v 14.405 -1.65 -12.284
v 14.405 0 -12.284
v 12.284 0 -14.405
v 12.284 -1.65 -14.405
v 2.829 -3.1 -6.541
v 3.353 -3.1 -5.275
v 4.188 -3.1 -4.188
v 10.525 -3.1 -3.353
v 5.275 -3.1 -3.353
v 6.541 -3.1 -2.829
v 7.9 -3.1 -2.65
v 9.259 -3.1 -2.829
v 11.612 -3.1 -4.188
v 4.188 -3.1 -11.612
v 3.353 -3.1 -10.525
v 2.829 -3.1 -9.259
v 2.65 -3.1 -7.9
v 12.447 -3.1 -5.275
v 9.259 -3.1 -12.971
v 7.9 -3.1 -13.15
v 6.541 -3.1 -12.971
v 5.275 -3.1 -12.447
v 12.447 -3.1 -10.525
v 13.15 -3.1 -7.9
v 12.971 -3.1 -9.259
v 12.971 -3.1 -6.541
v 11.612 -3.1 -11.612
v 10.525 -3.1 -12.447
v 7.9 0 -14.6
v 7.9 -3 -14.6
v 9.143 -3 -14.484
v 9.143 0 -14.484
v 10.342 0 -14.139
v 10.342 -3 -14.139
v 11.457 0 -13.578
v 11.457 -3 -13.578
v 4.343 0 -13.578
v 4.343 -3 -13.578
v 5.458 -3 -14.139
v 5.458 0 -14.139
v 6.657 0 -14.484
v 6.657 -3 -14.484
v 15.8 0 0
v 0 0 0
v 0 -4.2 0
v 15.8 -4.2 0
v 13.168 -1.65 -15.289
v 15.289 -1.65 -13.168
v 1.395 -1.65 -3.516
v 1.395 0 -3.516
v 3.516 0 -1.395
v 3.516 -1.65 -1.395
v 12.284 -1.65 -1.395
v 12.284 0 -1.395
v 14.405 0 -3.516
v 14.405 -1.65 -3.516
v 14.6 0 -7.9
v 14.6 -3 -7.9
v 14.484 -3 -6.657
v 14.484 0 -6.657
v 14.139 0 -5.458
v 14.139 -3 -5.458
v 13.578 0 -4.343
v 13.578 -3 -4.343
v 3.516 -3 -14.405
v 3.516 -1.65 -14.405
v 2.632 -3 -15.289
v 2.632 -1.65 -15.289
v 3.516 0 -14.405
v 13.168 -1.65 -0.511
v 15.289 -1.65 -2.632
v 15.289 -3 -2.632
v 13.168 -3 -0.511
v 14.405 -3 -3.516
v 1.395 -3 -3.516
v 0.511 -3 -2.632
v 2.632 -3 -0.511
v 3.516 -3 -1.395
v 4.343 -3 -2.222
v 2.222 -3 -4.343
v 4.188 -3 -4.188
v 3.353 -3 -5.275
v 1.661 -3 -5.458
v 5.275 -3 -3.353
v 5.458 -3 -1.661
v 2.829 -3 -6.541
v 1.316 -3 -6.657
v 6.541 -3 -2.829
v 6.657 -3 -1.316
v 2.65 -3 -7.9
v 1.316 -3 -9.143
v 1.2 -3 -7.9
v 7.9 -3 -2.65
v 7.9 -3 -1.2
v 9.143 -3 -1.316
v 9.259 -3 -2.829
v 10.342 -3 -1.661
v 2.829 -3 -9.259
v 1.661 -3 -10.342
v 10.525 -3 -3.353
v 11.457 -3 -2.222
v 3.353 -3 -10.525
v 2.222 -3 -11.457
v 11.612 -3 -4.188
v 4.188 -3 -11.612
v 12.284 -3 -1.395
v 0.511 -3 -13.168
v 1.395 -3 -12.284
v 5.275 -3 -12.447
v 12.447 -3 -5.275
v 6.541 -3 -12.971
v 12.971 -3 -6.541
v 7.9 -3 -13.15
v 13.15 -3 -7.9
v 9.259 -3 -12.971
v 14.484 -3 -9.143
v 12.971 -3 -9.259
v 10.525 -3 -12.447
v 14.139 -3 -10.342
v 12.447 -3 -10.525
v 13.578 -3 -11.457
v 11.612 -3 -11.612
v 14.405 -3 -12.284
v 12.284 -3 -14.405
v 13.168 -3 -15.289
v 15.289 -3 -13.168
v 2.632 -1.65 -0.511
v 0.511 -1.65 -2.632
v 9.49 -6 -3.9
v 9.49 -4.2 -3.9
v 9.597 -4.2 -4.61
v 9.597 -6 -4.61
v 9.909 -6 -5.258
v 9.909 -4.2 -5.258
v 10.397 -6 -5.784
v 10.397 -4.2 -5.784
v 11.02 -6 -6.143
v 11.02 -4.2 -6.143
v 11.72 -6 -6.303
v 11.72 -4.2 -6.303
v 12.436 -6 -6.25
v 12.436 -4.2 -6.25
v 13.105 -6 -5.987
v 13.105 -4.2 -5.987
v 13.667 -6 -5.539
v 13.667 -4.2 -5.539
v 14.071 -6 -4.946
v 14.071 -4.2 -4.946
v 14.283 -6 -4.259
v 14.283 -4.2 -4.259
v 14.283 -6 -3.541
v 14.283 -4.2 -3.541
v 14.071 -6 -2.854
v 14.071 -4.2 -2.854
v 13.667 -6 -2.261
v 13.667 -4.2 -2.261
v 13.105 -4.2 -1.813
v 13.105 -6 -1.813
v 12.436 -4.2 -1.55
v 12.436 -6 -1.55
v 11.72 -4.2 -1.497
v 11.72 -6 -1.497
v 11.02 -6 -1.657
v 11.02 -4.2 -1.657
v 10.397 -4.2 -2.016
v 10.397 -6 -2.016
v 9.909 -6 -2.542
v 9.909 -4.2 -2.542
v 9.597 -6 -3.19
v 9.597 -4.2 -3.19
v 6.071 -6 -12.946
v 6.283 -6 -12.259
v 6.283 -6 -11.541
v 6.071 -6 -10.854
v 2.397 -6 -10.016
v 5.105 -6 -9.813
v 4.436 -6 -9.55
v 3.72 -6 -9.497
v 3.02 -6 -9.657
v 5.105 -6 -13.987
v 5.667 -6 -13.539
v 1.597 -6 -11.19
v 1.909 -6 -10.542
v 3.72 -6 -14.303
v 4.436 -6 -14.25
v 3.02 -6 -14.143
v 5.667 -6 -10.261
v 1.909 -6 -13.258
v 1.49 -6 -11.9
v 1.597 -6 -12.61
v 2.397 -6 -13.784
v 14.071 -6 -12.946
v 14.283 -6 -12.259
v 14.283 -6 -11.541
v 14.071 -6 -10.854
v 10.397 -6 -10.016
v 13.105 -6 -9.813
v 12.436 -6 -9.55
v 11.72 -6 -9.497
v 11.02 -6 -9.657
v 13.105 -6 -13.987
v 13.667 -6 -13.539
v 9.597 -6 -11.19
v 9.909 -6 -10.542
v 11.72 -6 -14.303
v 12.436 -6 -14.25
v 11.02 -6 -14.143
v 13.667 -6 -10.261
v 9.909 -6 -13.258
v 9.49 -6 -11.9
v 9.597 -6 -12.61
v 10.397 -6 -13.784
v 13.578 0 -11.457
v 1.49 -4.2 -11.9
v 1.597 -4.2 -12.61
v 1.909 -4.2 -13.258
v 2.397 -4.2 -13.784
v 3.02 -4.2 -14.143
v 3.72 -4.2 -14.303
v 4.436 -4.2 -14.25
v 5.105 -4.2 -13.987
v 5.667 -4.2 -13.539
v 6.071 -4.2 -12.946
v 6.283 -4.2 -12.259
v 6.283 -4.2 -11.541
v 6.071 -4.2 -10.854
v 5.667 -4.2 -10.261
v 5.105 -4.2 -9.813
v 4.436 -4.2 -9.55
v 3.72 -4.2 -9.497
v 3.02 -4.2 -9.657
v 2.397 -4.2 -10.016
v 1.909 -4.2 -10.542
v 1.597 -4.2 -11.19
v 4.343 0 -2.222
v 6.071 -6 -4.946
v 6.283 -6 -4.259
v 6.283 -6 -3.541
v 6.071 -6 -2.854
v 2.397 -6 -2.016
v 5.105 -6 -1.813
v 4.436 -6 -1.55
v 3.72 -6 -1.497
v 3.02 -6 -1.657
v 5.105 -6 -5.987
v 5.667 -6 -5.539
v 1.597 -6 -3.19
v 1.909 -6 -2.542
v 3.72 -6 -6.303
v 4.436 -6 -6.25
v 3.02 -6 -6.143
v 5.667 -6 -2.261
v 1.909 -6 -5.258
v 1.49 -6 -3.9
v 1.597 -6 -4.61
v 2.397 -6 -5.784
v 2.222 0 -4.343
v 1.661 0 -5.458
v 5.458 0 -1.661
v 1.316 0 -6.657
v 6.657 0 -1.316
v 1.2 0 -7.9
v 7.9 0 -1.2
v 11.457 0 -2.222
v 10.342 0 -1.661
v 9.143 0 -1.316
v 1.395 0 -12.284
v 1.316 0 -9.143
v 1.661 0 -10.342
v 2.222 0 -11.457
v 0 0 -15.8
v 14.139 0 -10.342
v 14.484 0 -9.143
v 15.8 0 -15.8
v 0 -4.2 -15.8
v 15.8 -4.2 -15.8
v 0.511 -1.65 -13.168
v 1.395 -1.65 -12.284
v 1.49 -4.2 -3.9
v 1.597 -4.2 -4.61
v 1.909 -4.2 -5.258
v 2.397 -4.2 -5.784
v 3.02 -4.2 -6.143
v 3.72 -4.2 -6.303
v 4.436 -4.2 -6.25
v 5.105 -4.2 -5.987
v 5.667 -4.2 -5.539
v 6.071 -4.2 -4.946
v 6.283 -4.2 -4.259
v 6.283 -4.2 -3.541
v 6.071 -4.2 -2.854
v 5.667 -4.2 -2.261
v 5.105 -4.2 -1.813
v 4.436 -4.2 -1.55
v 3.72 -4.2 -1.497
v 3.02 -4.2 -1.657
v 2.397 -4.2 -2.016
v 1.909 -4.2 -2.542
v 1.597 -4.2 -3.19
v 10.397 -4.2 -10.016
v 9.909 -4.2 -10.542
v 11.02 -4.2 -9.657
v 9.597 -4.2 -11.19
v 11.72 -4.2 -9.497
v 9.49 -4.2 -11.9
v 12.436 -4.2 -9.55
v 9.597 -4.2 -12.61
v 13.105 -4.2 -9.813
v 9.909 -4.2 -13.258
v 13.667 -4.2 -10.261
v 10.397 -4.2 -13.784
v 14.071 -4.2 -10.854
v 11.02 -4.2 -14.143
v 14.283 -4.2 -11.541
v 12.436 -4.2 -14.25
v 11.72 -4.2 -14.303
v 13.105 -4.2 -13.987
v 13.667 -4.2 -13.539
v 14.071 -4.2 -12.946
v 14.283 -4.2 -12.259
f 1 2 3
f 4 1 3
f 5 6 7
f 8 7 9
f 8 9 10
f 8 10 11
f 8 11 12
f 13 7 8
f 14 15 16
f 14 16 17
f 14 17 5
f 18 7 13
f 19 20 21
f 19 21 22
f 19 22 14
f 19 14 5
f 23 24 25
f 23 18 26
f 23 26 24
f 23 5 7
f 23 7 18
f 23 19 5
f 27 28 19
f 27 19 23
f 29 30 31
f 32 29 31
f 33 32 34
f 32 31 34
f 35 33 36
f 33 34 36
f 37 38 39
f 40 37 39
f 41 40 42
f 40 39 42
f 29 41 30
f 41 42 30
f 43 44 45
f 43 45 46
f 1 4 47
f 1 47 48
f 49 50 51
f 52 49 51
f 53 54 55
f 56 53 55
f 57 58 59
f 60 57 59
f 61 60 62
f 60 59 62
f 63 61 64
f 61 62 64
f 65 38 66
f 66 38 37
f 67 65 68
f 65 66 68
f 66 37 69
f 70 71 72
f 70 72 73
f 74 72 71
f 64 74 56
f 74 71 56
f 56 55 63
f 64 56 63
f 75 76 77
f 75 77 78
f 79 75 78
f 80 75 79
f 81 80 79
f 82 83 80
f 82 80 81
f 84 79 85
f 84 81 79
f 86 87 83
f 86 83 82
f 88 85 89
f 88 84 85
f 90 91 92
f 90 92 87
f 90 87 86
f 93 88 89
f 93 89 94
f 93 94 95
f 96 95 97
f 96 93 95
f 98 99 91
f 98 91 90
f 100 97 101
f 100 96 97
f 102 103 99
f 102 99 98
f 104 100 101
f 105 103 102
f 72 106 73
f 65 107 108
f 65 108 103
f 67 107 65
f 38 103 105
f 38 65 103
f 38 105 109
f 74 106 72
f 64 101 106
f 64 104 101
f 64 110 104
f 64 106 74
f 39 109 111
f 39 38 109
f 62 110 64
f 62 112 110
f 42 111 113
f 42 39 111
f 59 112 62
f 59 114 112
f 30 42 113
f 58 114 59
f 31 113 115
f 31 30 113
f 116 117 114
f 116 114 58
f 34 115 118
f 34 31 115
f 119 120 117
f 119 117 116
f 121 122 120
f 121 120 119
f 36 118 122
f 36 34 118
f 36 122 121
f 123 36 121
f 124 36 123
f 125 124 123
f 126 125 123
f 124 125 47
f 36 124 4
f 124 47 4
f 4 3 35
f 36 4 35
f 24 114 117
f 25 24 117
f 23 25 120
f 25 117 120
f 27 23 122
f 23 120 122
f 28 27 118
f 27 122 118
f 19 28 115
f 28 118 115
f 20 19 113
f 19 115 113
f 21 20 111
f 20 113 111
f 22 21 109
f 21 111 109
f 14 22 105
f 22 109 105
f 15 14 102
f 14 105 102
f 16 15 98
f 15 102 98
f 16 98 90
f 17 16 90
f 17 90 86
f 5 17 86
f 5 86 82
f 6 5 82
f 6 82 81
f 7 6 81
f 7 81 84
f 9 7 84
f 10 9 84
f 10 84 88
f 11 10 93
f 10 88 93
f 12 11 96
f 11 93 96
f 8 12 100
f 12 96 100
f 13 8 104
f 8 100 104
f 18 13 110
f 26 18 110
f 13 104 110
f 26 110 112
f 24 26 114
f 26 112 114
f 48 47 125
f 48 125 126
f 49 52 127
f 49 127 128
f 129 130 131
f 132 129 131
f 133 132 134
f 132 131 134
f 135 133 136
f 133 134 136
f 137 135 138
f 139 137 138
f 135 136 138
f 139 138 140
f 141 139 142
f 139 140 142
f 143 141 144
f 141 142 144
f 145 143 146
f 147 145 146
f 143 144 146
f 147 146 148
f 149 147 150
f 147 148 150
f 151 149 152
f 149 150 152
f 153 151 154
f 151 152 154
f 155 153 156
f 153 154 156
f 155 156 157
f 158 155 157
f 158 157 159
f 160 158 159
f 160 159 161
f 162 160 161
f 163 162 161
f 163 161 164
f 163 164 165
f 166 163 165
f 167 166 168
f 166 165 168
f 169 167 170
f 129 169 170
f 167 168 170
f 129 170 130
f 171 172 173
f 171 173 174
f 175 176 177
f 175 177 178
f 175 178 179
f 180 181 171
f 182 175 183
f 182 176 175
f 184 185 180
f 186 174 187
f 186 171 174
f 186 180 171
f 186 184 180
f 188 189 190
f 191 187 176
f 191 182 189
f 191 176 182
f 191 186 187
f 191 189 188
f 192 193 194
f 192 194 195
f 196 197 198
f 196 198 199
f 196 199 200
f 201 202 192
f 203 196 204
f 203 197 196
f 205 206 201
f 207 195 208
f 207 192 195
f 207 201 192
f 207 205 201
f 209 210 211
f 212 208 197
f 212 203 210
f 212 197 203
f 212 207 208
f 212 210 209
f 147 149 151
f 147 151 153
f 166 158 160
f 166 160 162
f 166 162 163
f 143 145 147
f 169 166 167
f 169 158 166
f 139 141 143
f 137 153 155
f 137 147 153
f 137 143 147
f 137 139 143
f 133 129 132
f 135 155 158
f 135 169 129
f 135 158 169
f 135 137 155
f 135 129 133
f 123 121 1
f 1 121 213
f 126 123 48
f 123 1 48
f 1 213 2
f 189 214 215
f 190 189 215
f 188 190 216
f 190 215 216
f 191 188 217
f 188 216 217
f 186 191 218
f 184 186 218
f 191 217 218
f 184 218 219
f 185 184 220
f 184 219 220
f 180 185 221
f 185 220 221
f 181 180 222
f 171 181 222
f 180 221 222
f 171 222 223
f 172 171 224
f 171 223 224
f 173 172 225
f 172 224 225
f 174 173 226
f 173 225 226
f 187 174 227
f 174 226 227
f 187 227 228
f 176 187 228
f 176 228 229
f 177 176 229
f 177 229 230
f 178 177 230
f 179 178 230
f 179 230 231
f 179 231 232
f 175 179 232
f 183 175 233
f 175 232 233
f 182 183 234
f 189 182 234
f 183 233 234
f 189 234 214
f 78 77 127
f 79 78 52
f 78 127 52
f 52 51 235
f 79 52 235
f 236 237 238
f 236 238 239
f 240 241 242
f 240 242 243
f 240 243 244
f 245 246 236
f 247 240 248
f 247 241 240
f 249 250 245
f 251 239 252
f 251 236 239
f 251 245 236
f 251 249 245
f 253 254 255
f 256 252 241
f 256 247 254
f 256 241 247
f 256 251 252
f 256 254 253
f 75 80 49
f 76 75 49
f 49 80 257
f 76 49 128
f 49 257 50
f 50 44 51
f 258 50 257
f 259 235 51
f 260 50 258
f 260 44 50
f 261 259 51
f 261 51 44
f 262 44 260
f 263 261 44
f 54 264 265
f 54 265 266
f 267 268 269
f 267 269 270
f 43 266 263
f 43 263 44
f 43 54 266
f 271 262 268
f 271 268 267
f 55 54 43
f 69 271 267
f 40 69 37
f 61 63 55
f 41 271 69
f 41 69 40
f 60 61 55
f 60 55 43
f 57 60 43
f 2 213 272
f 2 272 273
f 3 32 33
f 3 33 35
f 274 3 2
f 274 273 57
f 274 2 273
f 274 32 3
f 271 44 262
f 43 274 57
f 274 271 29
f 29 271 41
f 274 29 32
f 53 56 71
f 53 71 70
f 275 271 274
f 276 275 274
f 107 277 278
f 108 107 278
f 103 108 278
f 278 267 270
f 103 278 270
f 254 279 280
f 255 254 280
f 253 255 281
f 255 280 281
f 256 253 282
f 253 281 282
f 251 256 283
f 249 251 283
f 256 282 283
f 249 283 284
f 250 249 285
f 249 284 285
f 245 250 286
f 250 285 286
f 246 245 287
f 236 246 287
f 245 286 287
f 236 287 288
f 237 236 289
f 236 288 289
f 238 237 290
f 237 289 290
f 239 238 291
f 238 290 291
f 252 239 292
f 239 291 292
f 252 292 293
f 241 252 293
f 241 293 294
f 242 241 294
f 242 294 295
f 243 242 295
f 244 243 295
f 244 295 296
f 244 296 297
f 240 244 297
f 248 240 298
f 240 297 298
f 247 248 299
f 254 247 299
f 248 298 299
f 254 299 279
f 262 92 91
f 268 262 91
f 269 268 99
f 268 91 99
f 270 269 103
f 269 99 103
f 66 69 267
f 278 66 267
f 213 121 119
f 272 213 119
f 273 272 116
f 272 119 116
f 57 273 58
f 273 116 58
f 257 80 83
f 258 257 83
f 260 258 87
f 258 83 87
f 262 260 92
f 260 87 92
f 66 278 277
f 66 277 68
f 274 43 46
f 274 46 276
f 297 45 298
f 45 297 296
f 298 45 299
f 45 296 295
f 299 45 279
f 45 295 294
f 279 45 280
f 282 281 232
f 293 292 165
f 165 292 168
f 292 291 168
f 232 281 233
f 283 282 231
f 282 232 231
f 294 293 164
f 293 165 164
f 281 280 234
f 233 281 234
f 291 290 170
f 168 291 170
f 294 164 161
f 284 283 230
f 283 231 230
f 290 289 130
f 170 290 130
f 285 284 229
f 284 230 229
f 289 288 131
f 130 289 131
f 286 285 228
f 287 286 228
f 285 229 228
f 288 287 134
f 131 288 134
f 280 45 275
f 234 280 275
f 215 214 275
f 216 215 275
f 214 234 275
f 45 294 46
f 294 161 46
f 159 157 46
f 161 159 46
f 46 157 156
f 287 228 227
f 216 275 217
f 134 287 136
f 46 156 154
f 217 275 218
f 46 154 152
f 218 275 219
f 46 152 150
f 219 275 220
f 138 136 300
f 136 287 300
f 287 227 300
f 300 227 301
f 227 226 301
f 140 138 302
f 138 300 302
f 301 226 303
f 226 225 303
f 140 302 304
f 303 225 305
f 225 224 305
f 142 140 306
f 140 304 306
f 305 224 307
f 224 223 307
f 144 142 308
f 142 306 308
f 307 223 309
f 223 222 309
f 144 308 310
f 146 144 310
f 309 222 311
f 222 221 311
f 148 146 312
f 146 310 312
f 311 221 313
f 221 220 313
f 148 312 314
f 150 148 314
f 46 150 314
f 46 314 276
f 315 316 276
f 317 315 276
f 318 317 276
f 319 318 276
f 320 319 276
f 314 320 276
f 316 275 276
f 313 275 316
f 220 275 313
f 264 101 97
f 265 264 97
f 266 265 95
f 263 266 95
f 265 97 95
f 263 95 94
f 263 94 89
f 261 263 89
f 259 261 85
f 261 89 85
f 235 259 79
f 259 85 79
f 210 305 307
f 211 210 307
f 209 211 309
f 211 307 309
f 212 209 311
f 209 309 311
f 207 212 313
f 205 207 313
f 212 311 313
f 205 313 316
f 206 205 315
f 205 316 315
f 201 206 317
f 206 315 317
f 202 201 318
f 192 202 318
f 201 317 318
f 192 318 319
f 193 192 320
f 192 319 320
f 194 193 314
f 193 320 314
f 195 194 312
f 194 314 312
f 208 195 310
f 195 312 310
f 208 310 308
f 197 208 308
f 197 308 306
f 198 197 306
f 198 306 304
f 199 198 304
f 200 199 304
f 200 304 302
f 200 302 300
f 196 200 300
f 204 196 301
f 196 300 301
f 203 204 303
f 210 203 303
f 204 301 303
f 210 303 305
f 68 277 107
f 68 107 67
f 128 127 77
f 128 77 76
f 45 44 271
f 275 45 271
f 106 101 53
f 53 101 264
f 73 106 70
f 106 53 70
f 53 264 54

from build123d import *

# Parameters (mm, degrees)
SKETCH2_W            = 15.8
SKETCH2_H            = 15.8
BOSS_EXTRUDE2_DEPTH  = 4.2
SKETCH4_W            = 13.4
SKETCH4_H            = 13.4
CUT_EXTRUDE1_DEPTH   = 3
SKETCH6_R            = 2.41
BOSS_EXTRUDE4_DEPTH  = 1.8
LPATTERN1_COUNT      = 2
LPATTERN1_PITCH      = 8
LPATTERN1_COUNT_DIR2 = 2
LPATTERN1_PITCH_DIR2 = 8
SKETCH8_R            = 5.25
CUT_EXTRUDE2_DEPTH   = 0.1
BOSS_EXTRUDE9_DEPTH  = 3
CUT_EXTRUDE3_DEPTH   = 3
SKETCH20_W           = 3
SKETCH20_H           = 1.35
CUT_EXTRUDE4_DEPTH   = 1.25
CIRPATTERN3_COUNT    = 4


with BuildPart() as part:
    # Sketch2 → Boss-Extrude2 (new body)
    with BuildSketch(Plane(origin=(0, 0, 0), x_dir=(1, 0, 0), z_dir=(0, 1, 0))):
        with Locations((7.9, 7.9)):
            Rectangle(SKETCH2_W, SKETCH2_H)
    extrude(amount=-BOSS_EXTRUDE2_DEPTH)

    # Sketch4 → Cut-Extrude1 (cut)
    with BuildSketch(Plane(origin=(0, 0, 0), x_dir=(1, 0, 0), z_dir=(0, 1, 0))):
        with Locations((7.9, 7.9)):
            Rectangle(SKETCH4_W, SKETCH4_H)
    extrude(amount=-CUT_EXTRUDE1_DEPTH, mode=Mode.SUBTRACT)

    # Sketch6 → Boss-Extrude4 (add)
    with BuildSketch(Plane(origin=(0, -4.2, 0), x_dir=(-1, 0, 0), z_dir=(0, -1, 0))):
        with Locations((-11.9, 11.9)):
            Circle(SKETCH6_R)
    boss_extrude4 = extrude(amount=BOSS_EXTRUDE4_DEPTH)

    # LPattern1: Boss-Extrude4 2 × 2
    with Locations(*[(-j * LPATTERN1_PITCH_DIR2, 0, i * LPATTERN1_PITCH) for i in range(LPATTERN1_COUNT) for j in range(LPATTERN1_COUNT_DIR2) if (i, j) != (0, 0)]):
        add(boss_extrude4)

    # Sketch8 → Cut-Extrude2 (cut)
    with BuildSketch(Plane(origin=(0, -3, 0), x_dir=(1, 0, 0), z_dir=(0, 1, 0))):
        with Locations((7.9, 7.9)):
            Circle(SKETCH8_R)
    extrude(amount=-CUT_EXTRUDE2_DEPTH, mode=Mode.SUBTRACT)

    # Sketch11 → Boss-Extrude9 (add)
    with BuildSketch(Plane(origin=(0, -3, 0), x_dir=(1, 0, 0), z_dir=(0, 1, 0))):
        with BuildLine():
            Line((7.899999971, 14.6), (1.2, 14.6))
            Line((1.2, 14.6), (1.2, 7.9))
            ThreePointArc((1.2, 7.9), (3.162384556, 12.637615424), (7.899999971, 14.6))
        make_face()
        with BuildLine():
            Line((14.6, 14.6), (7.899999971, 14.6))
            ThreePointArc((7.899999971, 14.6), (12.637615424, 12.637615444), (14.6, 7.9))
            Line((14.6, 7.9), (14.6, 14.6))
        make_face()
        with BuildLine():
            ThreePointArc((7.900000011, 1.2), (3.16238457, 3.162384562), (1.2, 7.9))
            Line((1.2, 7.9), (1.2, 1.2))
            Line((1.2, 1.2), (7.900000011, 1.2))
        make_face()
        with BuildLine():
            Line((14.6, 1.2), (14.6, 7.9))
            ThreePointArc((14.6, 7.9), (12.637615438, 3.16238457), (7.900000011, 1.2))
            Line((7.900000011, 1.2), (14.6, 1.2))
        make_face()
    extrude(amount=BOSS_EXTRUDE9_DEPTH)

    # Sketch12 → Cut-Extrude3 (cut)
    with BuildSketch(Plane(origin=(0, 0, 0), x_dir=(1, 0, 0), z_dir=(0, 1, 0))):
        Polygon((3.162384566, 12.637615434), (2.455277785, 13.344722215), (1.394617613, 12.284062043), (2.101724394, 11.576955262), align=None)
        with BuildLine():
            ThreePointArc((2.221981276, 11.45669838), (2.658816927, 12.073727351), (3.162384566, 12.637615434))
            Line((3.162384566, 12.637615434), (2.101724394, 11.576955262))
            Line((2.101724394, 11.576955262), (2.221981276, 11.45669838))
        make_face()
        with BuildLine():
            Line((4.223044738, 13.698275606), (3.162384566, 12.637615434))
            ThreePointArc((3.162384566, 12.637615434), (3.726272649, 13.141183073), (4.34330162, 13.578018724))
            Line((4.34330162, 13.578018724), (4.223044738, 13.698275606))
        make_face()
        Polygon((3.515937957, 14.405382387), (2.455277785, 13.344722215), (3.162384566, 12.637615434), (4.223044738, 13.698275606), align=None)
        with BuildLine():
            ThreePointArc((4.34330162, 13.578018724), (3.726272649, 13.141183073), (3.162384566, 12.637615434))
            ThreePointArc((3.162384566, 12.637615434), (2.658816927, 12.073727351), (2.221981276, 11.45669838))
            Line((2.221981276, 11.45669838), (2.423581348, 11.255098309))
            Line((2.423581348, 11.255098309), (4.544901691, 13.376418652))
            Line((4.544901691, 13.376418652), (4.34330162, 13.578018724))
        make_face()
        with BuildLine():
            ThreePointArc((14.6, 7.9), (11.145005458, 13.761735202), (4.34330162, 13.578018724))
            Line((4.34330162, 13.578018724), (4.544901691, 13.376418652))
            Line((4.544901691, 13.376418652), (2.423581348, 11.255098309))
            Line((2.423581348, 11.255098309), (2.221981276, 11.45669838))
            ThreePointArc((2.221981276, 11.45669838), (6.049692654, 1.460561925), (14.6, 7.9))
        make_face()
    cut_extrude3 = extrude(amount=-CUT_EXTRUDE3_DEPTH, mode=Mode.SUBTRACT)

    # Sketch20 → Cut-Extrude4 (cut)
    with BuildSketch(Plane(origin=(-5.444722215, 0, -5.444722215), x_dir=(0.707106781, 0, -0.707106781), z_dir=(0.707106781, 0, 0.707106781))):
        with Locations((11.172287143, -2.325)):
            Rectangle(SKETCH20_W, SKETCH20_H)
    cut_extrude4 = extrude(amount=-CUT_EXTRUDE4_DEPTH, mode=Mode.SUBTRACT)

    # CirPattern3: Cut-Extrude3, Cut-Extrude4 ×4 about axis
    cirpattern3_axis = Axis((7.9, 0, -7.9), (0, 1, 0))
    for i in range(1, CIRPATTERN3_COUNT):
        add(cut_extrude3.rotate(cirpattern3_axis, i * 360 / CIRPATTERN3_COUNT), mode=Mode.SUBTRACT)
        add(cut_extrude4.rotate(cirpattern3_axis, i * 360 / CIRPATTERN3_COUNT), mode=Mode.SUBTRACT)


solid = part.part
